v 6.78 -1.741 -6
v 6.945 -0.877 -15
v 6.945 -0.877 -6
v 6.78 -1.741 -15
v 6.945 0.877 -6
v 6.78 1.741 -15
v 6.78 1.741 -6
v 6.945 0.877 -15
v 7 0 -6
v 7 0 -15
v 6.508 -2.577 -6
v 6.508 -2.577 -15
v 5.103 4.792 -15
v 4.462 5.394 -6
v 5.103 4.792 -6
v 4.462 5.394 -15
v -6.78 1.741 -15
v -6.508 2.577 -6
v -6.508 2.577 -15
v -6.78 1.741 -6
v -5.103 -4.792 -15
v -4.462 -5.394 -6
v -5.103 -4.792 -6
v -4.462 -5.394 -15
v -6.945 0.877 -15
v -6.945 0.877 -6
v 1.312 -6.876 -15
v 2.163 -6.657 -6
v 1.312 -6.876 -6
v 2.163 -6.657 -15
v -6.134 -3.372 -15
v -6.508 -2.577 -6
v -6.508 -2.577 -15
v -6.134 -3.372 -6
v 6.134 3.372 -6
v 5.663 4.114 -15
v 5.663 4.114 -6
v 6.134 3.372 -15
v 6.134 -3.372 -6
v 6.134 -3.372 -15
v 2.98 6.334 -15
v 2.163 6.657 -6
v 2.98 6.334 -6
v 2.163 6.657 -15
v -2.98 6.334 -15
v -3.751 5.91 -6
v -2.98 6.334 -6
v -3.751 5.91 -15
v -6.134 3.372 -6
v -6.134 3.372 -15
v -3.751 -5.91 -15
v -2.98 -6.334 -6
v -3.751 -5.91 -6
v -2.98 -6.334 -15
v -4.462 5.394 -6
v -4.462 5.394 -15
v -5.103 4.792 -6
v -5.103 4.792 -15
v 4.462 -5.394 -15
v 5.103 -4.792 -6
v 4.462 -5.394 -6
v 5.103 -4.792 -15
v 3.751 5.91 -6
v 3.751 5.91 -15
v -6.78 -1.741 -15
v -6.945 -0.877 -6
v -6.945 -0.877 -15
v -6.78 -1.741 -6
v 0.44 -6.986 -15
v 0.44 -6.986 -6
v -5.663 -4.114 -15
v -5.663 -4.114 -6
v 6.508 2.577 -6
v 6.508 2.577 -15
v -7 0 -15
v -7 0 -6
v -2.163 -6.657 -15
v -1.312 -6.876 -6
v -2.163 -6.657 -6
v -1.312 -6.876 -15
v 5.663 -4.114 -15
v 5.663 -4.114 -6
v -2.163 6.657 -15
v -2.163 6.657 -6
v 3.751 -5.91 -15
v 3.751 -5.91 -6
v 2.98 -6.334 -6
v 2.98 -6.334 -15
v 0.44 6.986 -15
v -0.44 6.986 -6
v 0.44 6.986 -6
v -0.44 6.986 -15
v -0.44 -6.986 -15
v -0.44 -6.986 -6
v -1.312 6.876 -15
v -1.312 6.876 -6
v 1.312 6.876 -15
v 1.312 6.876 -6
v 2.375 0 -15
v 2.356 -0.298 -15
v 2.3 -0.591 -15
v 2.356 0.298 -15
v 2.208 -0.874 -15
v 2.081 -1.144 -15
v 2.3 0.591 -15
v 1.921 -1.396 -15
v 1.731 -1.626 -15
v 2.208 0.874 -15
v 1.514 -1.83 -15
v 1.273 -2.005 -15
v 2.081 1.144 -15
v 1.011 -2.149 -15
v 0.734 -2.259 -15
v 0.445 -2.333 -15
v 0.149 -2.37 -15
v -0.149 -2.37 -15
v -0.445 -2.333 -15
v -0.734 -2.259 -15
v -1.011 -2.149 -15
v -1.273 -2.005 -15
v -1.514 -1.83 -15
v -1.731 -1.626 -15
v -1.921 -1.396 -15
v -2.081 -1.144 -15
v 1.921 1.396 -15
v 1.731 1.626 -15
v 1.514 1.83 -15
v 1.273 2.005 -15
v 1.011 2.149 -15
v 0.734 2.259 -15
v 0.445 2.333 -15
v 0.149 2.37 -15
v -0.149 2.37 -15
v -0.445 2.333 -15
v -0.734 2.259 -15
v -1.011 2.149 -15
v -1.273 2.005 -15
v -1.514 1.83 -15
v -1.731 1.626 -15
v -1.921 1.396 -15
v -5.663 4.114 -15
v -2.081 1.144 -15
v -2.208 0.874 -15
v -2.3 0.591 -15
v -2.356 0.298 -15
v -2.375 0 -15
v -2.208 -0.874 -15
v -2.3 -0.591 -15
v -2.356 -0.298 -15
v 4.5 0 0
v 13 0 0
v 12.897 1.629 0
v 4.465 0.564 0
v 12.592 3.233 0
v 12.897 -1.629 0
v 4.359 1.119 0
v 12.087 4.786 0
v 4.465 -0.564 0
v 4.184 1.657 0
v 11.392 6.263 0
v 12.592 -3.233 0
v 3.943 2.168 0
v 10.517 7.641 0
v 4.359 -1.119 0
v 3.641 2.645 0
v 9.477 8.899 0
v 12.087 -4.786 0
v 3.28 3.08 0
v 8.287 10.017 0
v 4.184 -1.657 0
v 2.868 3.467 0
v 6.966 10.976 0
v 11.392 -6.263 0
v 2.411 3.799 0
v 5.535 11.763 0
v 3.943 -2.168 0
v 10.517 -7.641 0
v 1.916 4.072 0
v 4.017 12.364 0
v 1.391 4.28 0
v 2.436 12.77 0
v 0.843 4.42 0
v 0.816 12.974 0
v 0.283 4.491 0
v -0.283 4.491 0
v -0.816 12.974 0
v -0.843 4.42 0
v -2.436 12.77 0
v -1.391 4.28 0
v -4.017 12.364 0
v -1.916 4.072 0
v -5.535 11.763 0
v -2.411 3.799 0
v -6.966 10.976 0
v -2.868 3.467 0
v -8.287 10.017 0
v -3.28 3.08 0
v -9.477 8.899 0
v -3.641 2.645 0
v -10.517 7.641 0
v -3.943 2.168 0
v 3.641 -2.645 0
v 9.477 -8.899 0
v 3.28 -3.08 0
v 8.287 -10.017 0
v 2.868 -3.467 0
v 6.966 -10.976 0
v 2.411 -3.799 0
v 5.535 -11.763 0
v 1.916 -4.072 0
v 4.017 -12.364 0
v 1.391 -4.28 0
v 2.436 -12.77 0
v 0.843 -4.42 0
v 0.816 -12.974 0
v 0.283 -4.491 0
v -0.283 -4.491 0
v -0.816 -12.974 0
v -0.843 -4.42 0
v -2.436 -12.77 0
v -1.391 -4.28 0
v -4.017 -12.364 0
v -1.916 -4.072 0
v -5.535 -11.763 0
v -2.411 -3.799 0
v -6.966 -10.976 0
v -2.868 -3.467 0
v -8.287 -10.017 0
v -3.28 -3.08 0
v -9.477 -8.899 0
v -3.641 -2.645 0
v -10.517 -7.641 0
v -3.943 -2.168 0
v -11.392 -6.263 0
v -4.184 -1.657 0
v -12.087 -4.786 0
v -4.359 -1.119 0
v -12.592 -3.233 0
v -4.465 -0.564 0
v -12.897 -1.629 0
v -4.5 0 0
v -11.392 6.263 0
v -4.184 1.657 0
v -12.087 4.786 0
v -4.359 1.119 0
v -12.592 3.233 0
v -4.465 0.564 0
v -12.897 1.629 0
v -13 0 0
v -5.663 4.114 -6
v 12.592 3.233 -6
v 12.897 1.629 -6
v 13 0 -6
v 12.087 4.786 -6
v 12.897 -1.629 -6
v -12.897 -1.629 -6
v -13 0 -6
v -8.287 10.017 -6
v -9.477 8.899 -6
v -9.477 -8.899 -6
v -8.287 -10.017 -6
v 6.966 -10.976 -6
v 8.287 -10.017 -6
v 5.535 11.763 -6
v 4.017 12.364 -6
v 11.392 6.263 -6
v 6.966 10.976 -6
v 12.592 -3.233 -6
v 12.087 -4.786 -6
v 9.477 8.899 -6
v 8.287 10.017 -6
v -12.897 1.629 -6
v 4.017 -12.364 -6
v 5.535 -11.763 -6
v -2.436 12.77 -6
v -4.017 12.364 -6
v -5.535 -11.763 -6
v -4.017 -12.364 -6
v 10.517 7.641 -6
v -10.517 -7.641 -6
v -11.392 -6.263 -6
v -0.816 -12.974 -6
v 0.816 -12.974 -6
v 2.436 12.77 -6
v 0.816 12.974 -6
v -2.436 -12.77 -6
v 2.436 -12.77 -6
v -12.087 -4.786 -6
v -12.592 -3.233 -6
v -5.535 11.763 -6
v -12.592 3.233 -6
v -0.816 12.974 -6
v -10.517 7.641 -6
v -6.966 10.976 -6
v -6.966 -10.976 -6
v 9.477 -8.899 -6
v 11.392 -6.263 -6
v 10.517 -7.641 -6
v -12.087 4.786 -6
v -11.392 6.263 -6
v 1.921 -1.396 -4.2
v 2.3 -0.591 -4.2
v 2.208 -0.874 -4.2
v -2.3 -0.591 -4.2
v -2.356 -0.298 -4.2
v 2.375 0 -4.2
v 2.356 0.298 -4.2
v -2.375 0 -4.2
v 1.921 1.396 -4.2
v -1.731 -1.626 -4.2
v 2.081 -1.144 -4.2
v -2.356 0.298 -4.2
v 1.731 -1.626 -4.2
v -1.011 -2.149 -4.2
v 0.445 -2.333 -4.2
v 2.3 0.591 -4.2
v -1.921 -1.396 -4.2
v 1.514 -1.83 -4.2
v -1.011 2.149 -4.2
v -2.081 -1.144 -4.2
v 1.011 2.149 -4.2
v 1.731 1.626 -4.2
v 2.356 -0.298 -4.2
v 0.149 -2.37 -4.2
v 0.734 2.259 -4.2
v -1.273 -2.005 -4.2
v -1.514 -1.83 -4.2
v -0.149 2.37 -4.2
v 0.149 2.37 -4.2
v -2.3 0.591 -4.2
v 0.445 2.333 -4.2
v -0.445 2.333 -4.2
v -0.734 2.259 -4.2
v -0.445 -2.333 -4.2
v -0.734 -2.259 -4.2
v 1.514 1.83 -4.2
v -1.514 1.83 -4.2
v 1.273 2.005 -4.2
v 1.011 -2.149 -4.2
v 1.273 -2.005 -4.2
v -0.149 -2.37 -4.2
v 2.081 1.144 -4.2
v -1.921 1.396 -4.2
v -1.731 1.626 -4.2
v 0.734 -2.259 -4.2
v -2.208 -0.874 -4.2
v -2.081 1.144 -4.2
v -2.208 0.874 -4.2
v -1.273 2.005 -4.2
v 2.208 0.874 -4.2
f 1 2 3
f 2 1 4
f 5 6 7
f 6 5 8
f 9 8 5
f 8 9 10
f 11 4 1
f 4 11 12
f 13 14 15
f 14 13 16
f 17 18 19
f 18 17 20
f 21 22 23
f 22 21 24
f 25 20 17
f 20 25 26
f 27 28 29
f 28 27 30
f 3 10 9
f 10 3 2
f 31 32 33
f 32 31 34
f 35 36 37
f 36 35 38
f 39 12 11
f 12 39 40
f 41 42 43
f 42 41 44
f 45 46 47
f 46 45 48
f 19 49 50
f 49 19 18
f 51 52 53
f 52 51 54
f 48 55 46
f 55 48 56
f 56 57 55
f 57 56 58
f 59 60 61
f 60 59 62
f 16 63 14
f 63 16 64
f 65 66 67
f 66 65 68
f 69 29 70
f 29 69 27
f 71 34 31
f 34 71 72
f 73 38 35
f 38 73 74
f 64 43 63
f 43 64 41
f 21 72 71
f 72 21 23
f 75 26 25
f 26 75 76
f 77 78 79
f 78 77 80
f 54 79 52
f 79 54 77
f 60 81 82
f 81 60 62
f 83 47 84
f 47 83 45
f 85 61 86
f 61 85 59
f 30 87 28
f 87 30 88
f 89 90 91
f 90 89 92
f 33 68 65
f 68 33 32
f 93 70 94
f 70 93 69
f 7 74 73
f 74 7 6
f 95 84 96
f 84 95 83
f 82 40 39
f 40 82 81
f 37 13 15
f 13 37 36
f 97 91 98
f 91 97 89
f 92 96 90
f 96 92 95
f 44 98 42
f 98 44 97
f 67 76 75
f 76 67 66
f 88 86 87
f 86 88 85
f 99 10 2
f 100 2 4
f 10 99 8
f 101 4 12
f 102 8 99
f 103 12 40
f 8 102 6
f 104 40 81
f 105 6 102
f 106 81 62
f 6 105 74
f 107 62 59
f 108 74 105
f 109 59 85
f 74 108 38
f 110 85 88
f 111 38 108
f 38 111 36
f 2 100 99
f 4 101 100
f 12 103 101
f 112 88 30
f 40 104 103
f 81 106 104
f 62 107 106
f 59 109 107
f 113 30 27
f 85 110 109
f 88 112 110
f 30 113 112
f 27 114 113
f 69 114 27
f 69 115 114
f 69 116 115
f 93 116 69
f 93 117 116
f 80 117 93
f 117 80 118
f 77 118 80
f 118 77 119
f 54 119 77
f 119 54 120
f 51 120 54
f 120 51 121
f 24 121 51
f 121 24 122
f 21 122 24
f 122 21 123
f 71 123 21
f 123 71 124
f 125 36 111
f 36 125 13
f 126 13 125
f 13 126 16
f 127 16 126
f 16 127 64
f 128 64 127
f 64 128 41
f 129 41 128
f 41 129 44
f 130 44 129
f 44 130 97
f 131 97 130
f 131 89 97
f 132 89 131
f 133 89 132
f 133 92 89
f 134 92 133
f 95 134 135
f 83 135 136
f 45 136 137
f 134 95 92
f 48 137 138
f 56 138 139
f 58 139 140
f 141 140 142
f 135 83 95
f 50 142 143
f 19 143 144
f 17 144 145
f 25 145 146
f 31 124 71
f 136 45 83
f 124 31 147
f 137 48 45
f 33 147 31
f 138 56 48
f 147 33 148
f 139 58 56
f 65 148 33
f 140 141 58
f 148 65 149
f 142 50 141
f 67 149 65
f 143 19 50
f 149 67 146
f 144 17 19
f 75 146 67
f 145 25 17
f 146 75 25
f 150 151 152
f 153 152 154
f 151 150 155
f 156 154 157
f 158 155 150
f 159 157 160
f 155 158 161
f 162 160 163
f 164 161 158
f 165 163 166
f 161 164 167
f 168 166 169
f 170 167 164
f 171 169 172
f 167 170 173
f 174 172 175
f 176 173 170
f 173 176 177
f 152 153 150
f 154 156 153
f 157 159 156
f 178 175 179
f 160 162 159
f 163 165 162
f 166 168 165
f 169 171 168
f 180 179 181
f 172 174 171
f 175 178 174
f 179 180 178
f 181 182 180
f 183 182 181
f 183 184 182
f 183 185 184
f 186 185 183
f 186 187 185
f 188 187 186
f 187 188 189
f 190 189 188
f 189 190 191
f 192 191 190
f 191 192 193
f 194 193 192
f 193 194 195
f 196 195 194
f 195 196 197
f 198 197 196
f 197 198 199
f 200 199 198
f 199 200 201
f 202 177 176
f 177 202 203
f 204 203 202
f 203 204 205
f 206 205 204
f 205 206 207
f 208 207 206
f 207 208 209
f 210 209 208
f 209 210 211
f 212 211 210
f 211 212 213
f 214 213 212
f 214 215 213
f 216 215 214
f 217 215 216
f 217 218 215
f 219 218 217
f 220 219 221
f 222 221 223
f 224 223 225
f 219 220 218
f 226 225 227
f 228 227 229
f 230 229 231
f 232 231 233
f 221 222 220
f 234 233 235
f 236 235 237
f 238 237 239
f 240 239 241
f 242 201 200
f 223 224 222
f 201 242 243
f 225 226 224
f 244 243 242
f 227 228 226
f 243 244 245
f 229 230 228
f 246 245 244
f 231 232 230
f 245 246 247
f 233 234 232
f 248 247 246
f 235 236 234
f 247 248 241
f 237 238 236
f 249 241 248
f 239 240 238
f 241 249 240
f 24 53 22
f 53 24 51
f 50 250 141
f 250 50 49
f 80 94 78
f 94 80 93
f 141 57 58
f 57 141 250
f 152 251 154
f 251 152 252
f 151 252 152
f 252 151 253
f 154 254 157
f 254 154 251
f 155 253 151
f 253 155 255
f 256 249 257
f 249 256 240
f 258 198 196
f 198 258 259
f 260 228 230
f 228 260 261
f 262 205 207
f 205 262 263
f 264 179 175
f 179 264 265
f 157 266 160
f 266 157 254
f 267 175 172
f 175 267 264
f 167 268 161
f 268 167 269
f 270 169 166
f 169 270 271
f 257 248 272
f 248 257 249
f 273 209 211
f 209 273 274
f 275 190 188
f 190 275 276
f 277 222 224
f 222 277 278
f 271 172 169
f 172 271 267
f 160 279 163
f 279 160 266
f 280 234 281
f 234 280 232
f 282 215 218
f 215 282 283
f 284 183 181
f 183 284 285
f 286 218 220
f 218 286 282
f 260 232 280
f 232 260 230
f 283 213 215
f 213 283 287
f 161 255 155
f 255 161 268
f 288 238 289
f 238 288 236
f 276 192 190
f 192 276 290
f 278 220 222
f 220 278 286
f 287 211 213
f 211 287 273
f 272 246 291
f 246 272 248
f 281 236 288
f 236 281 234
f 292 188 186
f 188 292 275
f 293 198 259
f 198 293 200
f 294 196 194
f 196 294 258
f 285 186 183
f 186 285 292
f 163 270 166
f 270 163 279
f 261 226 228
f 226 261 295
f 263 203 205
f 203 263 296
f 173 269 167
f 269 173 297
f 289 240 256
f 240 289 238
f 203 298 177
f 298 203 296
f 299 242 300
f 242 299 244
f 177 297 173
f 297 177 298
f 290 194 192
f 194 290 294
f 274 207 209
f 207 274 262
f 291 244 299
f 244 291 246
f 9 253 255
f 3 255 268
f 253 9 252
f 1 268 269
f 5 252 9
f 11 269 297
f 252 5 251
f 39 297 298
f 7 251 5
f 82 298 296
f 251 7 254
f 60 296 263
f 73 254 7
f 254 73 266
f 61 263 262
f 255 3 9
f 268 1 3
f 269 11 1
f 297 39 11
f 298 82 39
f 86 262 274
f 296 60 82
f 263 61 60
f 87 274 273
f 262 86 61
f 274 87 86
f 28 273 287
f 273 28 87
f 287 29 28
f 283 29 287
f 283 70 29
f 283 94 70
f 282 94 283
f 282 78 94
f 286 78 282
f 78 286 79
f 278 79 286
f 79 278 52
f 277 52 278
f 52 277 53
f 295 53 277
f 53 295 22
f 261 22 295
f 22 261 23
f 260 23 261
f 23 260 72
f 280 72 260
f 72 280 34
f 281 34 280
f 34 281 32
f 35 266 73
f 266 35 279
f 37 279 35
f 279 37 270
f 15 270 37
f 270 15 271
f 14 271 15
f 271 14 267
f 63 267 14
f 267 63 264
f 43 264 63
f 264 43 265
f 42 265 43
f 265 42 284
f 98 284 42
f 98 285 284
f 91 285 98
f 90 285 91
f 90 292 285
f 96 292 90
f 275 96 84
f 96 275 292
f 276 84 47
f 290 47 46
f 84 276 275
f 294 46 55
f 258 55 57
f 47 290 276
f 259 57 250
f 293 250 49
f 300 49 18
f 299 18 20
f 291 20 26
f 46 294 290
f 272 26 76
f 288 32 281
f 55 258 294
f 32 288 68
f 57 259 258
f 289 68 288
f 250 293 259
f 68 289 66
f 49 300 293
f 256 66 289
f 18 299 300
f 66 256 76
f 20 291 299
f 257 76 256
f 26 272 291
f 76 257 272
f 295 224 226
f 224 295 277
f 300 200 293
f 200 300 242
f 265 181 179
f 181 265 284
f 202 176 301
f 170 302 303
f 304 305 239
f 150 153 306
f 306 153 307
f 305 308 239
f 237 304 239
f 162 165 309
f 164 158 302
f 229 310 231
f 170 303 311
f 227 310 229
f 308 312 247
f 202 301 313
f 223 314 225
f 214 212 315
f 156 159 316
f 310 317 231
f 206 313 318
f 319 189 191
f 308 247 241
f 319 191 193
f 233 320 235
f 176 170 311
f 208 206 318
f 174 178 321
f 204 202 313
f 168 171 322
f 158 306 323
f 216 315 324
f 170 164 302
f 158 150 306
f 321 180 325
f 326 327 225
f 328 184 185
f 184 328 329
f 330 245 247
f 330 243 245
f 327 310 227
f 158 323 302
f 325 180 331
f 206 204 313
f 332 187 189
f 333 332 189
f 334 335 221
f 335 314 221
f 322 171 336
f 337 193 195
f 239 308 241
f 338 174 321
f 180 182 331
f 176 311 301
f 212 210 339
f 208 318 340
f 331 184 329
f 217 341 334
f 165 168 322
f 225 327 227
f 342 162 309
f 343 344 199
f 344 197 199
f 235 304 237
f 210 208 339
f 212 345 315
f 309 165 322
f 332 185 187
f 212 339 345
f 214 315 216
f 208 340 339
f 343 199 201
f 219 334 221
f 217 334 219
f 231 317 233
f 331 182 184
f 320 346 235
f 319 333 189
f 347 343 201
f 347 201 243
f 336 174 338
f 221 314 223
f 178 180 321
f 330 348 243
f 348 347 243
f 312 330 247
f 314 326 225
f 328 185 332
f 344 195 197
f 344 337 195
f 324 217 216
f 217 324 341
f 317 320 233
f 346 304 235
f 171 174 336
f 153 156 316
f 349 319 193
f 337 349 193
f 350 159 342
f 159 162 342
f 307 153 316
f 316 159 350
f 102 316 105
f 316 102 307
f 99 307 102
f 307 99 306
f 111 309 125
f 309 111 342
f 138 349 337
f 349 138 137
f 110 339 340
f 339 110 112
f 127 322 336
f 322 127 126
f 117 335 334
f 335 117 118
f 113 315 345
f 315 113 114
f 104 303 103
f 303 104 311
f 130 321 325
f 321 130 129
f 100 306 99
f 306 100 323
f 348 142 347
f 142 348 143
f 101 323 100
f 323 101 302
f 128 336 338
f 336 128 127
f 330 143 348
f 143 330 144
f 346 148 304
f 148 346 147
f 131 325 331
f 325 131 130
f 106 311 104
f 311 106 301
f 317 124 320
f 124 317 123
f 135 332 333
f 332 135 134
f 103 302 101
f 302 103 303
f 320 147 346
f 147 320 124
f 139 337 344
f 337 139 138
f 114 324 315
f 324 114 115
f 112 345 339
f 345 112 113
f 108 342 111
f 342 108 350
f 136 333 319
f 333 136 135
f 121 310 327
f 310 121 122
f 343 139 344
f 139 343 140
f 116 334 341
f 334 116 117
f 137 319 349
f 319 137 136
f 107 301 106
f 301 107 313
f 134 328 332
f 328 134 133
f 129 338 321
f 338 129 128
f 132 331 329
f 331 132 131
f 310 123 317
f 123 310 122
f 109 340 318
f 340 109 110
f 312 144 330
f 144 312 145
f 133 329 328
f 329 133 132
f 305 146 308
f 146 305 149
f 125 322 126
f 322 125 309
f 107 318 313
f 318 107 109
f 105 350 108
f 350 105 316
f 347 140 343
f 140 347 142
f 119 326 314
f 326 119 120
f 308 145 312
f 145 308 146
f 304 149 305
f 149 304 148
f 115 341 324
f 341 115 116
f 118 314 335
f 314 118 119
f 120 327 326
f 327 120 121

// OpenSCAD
$fn = 50;


difference() {
	union() {
		translate(v = [0, 0, -15.0000000000]) {
			cylinder(h = 15, r = 7.0000000000);
		}
		translate(v = [0, 0, -6.0000000000]) {
			cylinder(h = 6, r = 13.0000000000);
		}
	}
	union() {
		translate(v = [0, 0, 0]) {
			rotate(a = [0, 0, 0]) {
				difference() {
					union() {
						#translate(v = [0, 0, -15.0000000000]) {
							cylinder(h = 15, r = 2.2500000000);
						}
						#translate(v = [0, 0, -4.2000000000]) {
							cylinder(h = 4.2000000000, r1 = 2.3750000000, r2 = 4.5000000000);
						}
						#translate(v = [0, 0, -15.0000000000]) {
							cylinder(h = 15, r = 2.3750000000);
						}
						#translate(v = [0, 0, -15.0000000000]) {
							cylinder(h = 15, r = 2.2500000000);
						}
					}
					union();
				}
			}
		}
	}
}
